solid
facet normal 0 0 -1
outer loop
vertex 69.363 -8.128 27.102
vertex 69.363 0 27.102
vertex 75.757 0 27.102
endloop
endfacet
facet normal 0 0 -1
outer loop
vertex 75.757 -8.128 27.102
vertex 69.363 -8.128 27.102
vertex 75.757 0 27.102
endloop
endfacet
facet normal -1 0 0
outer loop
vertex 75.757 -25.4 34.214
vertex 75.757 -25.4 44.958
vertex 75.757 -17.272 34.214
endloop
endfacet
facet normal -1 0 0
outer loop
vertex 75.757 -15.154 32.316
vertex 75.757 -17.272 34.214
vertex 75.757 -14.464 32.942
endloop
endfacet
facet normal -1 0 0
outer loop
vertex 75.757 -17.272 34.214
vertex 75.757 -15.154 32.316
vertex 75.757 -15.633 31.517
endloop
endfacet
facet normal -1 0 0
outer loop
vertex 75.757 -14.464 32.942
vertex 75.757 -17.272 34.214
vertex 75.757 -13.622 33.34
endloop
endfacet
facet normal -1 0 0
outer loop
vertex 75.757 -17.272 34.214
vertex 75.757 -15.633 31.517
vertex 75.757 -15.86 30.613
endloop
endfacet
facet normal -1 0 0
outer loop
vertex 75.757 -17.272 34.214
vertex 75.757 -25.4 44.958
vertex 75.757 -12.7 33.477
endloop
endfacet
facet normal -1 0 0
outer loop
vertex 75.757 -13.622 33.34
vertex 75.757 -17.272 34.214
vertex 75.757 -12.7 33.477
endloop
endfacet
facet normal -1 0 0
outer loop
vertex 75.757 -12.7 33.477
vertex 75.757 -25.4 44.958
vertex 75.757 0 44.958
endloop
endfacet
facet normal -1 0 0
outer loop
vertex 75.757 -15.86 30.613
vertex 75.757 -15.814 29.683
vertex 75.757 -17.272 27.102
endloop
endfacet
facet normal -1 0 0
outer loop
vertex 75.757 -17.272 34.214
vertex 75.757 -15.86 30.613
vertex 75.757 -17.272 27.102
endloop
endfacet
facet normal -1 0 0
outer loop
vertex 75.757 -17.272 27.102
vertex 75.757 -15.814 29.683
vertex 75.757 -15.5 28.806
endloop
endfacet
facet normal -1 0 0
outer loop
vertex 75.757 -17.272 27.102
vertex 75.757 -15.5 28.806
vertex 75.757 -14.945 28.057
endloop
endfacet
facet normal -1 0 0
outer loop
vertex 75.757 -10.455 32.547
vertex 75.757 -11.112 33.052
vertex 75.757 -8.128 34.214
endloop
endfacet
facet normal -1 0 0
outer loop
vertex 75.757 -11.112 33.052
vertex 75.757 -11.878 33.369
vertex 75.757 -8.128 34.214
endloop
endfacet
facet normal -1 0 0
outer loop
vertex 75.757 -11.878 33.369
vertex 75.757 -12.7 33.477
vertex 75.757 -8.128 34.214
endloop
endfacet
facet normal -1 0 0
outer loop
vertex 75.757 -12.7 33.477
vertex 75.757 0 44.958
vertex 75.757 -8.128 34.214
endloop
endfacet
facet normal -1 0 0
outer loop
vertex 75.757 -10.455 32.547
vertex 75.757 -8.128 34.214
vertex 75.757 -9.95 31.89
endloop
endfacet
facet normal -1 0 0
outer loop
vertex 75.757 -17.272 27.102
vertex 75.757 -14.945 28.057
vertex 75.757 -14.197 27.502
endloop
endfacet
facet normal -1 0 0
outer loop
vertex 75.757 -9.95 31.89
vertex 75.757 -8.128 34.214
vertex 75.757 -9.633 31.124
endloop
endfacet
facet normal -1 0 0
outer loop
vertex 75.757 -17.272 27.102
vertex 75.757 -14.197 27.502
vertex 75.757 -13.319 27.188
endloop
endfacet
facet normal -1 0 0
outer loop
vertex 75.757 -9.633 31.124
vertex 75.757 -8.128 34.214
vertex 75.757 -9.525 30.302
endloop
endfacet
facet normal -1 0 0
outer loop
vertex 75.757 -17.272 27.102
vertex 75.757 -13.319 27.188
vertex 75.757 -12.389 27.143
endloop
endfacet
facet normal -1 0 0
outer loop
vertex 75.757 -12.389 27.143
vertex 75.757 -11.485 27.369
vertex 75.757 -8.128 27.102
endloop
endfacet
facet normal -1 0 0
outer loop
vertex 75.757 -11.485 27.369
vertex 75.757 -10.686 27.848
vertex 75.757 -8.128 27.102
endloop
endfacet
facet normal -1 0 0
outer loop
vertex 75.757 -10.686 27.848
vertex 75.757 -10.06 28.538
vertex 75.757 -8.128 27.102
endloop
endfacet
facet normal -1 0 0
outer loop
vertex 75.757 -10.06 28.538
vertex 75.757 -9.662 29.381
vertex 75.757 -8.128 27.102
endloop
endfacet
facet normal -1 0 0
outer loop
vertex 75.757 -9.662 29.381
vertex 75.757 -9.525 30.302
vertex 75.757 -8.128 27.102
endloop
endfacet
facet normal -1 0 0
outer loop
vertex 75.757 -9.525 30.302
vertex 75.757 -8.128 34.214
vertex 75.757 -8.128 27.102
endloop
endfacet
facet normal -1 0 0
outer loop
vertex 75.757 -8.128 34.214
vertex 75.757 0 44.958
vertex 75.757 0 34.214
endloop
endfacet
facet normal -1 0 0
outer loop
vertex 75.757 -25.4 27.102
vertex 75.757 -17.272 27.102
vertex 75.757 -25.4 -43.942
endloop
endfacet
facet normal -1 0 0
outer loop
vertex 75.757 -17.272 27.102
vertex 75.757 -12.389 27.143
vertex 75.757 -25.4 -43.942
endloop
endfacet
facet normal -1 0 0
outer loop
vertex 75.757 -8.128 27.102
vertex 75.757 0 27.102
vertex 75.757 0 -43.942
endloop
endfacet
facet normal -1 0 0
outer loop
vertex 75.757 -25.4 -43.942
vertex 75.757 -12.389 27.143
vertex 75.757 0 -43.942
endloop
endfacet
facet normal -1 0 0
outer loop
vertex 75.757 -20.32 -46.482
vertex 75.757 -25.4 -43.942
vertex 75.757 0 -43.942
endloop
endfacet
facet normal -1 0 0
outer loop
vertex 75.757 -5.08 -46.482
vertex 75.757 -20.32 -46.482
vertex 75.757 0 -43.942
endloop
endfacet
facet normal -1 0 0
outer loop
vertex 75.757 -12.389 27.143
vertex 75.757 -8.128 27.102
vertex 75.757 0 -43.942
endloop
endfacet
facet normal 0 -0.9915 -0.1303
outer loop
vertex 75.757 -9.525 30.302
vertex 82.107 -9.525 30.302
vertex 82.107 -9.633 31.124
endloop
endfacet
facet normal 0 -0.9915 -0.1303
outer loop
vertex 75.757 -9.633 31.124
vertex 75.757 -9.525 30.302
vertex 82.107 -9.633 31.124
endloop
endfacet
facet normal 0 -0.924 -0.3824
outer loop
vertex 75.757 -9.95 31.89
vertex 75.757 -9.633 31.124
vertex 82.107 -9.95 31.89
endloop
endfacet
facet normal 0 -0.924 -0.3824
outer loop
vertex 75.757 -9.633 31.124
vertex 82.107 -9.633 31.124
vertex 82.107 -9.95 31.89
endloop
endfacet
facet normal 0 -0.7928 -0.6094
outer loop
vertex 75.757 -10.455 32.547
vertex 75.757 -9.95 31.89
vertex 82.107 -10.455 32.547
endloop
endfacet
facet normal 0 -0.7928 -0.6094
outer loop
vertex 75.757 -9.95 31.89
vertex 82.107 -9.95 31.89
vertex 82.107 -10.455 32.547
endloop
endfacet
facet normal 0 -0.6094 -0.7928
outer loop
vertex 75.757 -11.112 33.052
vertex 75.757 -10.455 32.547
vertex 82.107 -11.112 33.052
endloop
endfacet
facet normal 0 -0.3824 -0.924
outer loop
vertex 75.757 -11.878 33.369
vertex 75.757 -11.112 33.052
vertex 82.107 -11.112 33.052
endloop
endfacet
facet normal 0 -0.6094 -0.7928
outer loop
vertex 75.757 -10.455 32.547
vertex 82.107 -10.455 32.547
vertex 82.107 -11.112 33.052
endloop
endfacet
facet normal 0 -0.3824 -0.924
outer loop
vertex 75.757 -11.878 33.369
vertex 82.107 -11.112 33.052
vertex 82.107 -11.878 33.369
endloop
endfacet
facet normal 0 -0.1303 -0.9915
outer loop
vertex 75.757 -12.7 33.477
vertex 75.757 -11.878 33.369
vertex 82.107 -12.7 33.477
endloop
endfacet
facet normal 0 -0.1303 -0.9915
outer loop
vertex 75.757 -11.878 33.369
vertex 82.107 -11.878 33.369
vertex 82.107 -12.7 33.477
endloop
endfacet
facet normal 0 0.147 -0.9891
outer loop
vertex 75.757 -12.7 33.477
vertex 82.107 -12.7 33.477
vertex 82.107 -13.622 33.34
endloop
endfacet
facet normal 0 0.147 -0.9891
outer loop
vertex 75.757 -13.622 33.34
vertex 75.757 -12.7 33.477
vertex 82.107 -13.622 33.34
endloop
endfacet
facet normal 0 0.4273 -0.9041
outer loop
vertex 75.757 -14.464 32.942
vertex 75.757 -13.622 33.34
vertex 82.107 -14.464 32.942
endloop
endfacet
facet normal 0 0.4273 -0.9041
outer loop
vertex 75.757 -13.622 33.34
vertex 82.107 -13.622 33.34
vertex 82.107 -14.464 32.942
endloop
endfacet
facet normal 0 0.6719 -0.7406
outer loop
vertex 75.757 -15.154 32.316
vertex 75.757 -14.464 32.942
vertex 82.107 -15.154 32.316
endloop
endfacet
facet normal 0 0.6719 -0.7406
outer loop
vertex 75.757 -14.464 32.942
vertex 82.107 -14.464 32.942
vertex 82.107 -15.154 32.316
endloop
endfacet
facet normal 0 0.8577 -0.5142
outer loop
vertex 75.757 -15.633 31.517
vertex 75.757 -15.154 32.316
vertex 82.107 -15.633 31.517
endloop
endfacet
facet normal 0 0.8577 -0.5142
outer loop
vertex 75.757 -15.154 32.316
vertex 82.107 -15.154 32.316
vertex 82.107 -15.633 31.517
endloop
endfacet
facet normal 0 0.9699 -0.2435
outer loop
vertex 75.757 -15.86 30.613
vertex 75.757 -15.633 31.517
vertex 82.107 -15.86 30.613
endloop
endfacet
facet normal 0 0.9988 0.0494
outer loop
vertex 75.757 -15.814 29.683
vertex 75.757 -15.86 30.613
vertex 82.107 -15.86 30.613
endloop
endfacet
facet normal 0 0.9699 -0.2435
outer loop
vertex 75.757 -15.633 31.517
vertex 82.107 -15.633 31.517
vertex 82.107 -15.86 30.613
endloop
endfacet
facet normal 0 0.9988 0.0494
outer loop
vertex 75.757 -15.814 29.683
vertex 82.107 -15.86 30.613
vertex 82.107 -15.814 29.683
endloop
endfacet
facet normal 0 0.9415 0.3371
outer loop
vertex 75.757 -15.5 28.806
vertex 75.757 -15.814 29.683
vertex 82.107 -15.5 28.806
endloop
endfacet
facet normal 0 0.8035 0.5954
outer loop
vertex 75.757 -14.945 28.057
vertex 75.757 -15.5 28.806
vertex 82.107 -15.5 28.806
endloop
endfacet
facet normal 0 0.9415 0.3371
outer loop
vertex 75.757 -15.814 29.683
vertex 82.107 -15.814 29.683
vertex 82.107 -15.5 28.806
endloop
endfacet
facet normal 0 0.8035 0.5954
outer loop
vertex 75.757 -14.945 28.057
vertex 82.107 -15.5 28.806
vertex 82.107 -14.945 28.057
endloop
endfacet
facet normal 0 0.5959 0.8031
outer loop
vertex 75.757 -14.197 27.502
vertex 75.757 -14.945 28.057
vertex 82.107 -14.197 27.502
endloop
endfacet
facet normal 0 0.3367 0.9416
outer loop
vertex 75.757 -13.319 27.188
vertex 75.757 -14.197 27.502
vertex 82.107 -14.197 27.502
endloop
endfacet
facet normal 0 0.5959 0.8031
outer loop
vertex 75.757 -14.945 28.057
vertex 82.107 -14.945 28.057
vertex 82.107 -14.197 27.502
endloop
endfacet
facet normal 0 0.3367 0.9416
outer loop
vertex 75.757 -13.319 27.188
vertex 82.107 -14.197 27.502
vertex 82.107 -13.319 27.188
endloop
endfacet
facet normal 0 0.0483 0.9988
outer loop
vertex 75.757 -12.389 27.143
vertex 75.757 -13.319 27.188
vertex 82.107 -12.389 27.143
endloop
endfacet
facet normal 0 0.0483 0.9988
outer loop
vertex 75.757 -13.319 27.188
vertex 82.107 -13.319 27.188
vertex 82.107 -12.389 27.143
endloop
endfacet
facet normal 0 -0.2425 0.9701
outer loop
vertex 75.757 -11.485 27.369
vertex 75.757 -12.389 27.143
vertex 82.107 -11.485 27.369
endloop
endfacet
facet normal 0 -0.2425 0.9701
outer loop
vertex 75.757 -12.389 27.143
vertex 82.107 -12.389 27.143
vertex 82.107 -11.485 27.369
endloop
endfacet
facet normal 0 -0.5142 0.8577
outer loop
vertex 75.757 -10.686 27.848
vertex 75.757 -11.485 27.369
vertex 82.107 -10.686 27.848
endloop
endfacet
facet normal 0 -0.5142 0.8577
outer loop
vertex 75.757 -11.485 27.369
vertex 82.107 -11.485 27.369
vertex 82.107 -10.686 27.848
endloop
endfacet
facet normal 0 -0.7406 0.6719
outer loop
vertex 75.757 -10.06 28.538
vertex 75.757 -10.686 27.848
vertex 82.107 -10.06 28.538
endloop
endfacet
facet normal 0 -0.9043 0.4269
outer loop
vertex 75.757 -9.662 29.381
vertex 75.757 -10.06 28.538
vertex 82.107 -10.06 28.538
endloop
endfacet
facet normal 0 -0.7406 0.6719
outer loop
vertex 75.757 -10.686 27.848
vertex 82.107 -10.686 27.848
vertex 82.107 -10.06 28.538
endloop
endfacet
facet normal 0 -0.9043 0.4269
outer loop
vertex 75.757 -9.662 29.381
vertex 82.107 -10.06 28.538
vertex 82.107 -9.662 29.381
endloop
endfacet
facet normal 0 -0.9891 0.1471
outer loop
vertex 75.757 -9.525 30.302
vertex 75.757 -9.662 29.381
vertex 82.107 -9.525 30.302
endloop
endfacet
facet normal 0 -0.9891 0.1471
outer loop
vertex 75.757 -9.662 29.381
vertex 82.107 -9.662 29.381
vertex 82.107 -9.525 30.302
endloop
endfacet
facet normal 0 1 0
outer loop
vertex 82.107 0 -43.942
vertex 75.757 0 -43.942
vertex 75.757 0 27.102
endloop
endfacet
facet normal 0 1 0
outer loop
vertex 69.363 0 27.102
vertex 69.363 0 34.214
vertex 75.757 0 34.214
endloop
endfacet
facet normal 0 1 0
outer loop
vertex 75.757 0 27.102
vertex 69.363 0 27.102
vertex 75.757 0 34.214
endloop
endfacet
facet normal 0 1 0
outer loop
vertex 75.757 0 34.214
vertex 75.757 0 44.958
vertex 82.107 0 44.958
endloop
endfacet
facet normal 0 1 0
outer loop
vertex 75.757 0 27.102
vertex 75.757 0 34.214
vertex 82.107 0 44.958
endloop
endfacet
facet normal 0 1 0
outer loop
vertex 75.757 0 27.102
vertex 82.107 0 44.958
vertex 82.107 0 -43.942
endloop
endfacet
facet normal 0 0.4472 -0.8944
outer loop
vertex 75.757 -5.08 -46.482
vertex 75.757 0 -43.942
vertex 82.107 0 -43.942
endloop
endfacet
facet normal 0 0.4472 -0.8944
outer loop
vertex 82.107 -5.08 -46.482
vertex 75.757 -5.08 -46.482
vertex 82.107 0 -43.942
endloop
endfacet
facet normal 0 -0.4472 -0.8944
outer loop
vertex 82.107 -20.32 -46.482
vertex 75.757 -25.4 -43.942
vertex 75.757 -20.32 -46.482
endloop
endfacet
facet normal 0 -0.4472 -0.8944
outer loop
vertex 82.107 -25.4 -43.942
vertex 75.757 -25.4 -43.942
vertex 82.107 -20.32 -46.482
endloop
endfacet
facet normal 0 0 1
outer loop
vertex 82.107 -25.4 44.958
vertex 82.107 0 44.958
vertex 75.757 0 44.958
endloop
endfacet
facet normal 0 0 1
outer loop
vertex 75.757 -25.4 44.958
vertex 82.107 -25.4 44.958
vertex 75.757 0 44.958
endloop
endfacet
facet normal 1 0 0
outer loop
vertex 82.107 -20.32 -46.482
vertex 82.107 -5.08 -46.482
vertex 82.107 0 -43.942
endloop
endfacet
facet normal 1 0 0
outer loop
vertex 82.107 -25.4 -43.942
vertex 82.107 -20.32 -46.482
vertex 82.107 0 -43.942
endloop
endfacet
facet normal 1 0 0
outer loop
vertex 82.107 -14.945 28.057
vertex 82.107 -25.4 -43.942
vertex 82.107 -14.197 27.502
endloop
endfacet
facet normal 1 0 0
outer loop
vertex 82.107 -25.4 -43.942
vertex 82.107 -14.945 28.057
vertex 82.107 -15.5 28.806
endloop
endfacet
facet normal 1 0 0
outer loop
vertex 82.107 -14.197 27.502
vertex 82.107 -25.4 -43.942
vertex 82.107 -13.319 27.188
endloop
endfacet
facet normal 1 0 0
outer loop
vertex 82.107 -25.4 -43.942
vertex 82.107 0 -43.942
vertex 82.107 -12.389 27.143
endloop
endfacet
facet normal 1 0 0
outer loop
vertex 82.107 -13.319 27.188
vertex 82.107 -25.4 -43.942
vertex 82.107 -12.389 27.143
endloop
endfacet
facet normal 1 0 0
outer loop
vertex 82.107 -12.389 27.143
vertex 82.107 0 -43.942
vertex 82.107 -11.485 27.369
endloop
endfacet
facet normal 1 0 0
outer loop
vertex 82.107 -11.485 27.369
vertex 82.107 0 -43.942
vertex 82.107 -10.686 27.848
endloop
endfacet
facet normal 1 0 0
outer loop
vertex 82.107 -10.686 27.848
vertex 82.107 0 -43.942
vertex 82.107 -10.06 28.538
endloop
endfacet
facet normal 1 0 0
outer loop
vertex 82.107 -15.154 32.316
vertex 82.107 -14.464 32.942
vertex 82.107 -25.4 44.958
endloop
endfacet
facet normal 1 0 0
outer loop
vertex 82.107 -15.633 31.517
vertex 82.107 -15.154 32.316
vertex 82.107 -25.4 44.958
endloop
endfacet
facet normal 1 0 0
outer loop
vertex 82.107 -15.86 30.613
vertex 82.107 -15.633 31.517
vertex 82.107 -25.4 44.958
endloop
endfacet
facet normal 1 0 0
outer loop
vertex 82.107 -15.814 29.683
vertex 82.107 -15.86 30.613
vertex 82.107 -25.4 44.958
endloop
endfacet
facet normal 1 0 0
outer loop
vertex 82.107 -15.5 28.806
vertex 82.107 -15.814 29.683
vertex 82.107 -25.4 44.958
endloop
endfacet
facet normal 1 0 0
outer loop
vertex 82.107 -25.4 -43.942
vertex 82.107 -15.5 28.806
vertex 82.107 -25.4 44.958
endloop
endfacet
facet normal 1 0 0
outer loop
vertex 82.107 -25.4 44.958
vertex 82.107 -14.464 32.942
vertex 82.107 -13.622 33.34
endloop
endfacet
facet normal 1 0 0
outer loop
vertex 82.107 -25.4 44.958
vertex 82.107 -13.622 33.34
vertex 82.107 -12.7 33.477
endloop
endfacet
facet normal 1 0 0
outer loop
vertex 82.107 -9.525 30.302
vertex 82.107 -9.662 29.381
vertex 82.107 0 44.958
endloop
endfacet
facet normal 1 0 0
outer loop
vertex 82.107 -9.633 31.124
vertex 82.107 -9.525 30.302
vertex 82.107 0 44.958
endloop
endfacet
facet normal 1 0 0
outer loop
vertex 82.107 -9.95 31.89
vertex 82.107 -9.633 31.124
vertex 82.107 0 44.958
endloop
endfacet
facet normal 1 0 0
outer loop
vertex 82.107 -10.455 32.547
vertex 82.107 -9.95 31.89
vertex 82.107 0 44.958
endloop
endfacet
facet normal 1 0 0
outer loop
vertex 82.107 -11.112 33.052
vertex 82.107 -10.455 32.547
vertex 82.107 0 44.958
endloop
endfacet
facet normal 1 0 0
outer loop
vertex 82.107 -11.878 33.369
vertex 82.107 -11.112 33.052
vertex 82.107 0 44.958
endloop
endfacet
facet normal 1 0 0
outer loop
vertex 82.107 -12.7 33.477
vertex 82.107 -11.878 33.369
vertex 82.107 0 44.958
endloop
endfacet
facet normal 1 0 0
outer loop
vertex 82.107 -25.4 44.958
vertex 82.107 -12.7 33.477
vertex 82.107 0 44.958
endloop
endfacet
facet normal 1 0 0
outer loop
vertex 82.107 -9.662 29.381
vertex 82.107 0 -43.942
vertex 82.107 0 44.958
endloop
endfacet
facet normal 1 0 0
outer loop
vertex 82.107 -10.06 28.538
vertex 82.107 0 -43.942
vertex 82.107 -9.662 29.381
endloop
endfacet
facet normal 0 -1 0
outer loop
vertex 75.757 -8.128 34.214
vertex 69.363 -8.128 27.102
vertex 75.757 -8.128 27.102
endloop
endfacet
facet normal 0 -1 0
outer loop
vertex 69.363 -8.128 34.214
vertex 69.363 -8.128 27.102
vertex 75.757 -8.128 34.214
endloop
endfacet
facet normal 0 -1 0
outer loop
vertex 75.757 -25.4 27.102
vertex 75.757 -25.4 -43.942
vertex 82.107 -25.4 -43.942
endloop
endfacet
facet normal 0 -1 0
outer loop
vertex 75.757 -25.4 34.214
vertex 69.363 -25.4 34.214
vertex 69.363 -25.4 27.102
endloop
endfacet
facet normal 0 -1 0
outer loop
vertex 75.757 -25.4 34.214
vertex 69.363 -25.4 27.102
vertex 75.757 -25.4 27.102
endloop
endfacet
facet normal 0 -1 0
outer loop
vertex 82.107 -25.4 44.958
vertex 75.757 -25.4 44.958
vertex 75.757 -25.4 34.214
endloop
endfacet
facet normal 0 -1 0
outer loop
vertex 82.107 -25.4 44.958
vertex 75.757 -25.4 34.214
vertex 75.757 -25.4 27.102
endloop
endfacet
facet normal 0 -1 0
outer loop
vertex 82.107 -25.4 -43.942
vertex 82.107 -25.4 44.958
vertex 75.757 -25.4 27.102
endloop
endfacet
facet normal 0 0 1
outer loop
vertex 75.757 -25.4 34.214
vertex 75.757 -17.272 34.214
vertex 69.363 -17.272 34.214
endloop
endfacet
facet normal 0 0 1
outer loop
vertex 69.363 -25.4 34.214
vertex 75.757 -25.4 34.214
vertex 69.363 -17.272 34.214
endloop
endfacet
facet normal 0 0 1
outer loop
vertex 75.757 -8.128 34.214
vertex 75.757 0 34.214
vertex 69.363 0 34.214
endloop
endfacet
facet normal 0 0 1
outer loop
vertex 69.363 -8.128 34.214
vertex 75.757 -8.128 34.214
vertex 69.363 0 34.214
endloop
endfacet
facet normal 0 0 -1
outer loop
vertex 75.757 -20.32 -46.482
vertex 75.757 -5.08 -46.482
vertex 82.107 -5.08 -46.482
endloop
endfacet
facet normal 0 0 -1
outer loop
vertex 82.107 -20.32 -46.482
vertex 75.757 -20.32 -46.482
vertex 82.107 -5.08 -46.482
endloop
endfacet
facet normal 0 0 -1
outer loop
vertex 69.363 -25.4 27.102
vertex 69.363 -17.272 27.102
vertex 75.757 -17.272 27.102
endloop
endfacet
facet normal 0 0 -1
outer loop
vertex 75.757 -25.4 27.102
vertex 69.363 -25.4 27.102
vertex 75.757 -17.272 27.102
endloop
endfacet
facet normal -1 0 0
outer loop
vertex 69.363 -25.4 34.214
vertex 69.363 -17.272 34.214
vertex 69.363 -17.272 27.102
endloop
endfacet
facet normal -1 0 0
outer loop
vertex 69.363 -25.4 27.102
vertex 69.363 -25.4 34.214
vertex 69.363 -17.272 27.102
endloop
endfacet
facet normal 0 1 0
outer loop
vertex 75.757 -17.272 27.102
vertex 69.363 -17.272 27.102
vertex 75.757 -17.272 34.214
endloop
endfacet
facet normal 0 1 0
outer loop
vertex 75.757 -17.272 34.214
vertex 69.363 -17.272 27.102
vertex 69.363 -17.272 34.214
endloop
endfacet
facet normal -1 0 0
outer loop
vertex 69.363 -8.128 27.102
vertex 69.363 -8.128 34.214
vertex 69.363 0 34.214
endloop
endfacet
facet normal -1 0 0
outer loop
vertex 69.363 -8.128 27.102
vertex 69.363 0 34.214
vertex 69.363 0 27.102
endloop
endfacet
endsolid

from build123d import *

# Parameters (mm, degrees)
F1_DEPTH = 25.4
F3_W     = 9.144
F3_H     = 7.112
F4_DEPTH = 6.3936169982
F5_DEPTH = 6.35
F6_SIZE2 = 2.54
F6_SIZE  = 5.08


with BuildPart() as f1:
    # F0 (on Front) → F1 (new body)
    with BuildSketch(Plane.XZ):
        Polygon((82.1067863703, 44.9580137503), (75.7567863703, 44.9580137503), (75.7567863703, 34.2138137503), (69.3631693721, 34.2138137503), (69.3631693721, 27.1018137503), (75.7567863703, 27.1018137503), (75.7567863703, -46.4819862497), (82.1067863703, -46.4819862497), align=None)
    extrude(amount=F1_DEPTH)

    # F3 (on face) → F4 (cut, through all)
    with BuildSketch(Plane(origin=(69.3631693721, 0, 0), x_dir=(0, -1, 0), z_dir=(-1, 0, 0))):
        with Locations((12.7, 30.6578137503)):
            Rectangle(F3_W, F3_H)
    extrude(amount=-F4_DEPTH, mode=Mode.SUBTRACT)

    # F2 (on face) → F5 (cut, through all)
    with BuildSketch(Plane.YZ.offset(82.1067863703)):
        with BuildLine():
            ThreePointArc((-9.525, 30.3022137503), (-10.4549359697, 32.5472777806), (-12.7, 33.4772137503))
            ThreePointArc((-12.7, 33.4772137503), (-14.9450640303, 28.05714972), (-9.525, 30.3022137503))
        make_face()
    extrude(amount=-F5_DEPTH, mode=Mode.SUBTRACT)

    # F6
    f6_edges = [f1.edges().sort_by_distance(p)[0] for p in [
        (78.931786, -25.4, -46.481986),
        (78.931786, 0, -46.481986),
    ]]
    f6_side = f1.faces().sort_by_distance((78.931786, -12.7, -46.481986))[0]
    chamfer(f6_edges, length=F6_SIZE, length2=F6_SIZE2, reference=f6_side)


solid = f1.part
